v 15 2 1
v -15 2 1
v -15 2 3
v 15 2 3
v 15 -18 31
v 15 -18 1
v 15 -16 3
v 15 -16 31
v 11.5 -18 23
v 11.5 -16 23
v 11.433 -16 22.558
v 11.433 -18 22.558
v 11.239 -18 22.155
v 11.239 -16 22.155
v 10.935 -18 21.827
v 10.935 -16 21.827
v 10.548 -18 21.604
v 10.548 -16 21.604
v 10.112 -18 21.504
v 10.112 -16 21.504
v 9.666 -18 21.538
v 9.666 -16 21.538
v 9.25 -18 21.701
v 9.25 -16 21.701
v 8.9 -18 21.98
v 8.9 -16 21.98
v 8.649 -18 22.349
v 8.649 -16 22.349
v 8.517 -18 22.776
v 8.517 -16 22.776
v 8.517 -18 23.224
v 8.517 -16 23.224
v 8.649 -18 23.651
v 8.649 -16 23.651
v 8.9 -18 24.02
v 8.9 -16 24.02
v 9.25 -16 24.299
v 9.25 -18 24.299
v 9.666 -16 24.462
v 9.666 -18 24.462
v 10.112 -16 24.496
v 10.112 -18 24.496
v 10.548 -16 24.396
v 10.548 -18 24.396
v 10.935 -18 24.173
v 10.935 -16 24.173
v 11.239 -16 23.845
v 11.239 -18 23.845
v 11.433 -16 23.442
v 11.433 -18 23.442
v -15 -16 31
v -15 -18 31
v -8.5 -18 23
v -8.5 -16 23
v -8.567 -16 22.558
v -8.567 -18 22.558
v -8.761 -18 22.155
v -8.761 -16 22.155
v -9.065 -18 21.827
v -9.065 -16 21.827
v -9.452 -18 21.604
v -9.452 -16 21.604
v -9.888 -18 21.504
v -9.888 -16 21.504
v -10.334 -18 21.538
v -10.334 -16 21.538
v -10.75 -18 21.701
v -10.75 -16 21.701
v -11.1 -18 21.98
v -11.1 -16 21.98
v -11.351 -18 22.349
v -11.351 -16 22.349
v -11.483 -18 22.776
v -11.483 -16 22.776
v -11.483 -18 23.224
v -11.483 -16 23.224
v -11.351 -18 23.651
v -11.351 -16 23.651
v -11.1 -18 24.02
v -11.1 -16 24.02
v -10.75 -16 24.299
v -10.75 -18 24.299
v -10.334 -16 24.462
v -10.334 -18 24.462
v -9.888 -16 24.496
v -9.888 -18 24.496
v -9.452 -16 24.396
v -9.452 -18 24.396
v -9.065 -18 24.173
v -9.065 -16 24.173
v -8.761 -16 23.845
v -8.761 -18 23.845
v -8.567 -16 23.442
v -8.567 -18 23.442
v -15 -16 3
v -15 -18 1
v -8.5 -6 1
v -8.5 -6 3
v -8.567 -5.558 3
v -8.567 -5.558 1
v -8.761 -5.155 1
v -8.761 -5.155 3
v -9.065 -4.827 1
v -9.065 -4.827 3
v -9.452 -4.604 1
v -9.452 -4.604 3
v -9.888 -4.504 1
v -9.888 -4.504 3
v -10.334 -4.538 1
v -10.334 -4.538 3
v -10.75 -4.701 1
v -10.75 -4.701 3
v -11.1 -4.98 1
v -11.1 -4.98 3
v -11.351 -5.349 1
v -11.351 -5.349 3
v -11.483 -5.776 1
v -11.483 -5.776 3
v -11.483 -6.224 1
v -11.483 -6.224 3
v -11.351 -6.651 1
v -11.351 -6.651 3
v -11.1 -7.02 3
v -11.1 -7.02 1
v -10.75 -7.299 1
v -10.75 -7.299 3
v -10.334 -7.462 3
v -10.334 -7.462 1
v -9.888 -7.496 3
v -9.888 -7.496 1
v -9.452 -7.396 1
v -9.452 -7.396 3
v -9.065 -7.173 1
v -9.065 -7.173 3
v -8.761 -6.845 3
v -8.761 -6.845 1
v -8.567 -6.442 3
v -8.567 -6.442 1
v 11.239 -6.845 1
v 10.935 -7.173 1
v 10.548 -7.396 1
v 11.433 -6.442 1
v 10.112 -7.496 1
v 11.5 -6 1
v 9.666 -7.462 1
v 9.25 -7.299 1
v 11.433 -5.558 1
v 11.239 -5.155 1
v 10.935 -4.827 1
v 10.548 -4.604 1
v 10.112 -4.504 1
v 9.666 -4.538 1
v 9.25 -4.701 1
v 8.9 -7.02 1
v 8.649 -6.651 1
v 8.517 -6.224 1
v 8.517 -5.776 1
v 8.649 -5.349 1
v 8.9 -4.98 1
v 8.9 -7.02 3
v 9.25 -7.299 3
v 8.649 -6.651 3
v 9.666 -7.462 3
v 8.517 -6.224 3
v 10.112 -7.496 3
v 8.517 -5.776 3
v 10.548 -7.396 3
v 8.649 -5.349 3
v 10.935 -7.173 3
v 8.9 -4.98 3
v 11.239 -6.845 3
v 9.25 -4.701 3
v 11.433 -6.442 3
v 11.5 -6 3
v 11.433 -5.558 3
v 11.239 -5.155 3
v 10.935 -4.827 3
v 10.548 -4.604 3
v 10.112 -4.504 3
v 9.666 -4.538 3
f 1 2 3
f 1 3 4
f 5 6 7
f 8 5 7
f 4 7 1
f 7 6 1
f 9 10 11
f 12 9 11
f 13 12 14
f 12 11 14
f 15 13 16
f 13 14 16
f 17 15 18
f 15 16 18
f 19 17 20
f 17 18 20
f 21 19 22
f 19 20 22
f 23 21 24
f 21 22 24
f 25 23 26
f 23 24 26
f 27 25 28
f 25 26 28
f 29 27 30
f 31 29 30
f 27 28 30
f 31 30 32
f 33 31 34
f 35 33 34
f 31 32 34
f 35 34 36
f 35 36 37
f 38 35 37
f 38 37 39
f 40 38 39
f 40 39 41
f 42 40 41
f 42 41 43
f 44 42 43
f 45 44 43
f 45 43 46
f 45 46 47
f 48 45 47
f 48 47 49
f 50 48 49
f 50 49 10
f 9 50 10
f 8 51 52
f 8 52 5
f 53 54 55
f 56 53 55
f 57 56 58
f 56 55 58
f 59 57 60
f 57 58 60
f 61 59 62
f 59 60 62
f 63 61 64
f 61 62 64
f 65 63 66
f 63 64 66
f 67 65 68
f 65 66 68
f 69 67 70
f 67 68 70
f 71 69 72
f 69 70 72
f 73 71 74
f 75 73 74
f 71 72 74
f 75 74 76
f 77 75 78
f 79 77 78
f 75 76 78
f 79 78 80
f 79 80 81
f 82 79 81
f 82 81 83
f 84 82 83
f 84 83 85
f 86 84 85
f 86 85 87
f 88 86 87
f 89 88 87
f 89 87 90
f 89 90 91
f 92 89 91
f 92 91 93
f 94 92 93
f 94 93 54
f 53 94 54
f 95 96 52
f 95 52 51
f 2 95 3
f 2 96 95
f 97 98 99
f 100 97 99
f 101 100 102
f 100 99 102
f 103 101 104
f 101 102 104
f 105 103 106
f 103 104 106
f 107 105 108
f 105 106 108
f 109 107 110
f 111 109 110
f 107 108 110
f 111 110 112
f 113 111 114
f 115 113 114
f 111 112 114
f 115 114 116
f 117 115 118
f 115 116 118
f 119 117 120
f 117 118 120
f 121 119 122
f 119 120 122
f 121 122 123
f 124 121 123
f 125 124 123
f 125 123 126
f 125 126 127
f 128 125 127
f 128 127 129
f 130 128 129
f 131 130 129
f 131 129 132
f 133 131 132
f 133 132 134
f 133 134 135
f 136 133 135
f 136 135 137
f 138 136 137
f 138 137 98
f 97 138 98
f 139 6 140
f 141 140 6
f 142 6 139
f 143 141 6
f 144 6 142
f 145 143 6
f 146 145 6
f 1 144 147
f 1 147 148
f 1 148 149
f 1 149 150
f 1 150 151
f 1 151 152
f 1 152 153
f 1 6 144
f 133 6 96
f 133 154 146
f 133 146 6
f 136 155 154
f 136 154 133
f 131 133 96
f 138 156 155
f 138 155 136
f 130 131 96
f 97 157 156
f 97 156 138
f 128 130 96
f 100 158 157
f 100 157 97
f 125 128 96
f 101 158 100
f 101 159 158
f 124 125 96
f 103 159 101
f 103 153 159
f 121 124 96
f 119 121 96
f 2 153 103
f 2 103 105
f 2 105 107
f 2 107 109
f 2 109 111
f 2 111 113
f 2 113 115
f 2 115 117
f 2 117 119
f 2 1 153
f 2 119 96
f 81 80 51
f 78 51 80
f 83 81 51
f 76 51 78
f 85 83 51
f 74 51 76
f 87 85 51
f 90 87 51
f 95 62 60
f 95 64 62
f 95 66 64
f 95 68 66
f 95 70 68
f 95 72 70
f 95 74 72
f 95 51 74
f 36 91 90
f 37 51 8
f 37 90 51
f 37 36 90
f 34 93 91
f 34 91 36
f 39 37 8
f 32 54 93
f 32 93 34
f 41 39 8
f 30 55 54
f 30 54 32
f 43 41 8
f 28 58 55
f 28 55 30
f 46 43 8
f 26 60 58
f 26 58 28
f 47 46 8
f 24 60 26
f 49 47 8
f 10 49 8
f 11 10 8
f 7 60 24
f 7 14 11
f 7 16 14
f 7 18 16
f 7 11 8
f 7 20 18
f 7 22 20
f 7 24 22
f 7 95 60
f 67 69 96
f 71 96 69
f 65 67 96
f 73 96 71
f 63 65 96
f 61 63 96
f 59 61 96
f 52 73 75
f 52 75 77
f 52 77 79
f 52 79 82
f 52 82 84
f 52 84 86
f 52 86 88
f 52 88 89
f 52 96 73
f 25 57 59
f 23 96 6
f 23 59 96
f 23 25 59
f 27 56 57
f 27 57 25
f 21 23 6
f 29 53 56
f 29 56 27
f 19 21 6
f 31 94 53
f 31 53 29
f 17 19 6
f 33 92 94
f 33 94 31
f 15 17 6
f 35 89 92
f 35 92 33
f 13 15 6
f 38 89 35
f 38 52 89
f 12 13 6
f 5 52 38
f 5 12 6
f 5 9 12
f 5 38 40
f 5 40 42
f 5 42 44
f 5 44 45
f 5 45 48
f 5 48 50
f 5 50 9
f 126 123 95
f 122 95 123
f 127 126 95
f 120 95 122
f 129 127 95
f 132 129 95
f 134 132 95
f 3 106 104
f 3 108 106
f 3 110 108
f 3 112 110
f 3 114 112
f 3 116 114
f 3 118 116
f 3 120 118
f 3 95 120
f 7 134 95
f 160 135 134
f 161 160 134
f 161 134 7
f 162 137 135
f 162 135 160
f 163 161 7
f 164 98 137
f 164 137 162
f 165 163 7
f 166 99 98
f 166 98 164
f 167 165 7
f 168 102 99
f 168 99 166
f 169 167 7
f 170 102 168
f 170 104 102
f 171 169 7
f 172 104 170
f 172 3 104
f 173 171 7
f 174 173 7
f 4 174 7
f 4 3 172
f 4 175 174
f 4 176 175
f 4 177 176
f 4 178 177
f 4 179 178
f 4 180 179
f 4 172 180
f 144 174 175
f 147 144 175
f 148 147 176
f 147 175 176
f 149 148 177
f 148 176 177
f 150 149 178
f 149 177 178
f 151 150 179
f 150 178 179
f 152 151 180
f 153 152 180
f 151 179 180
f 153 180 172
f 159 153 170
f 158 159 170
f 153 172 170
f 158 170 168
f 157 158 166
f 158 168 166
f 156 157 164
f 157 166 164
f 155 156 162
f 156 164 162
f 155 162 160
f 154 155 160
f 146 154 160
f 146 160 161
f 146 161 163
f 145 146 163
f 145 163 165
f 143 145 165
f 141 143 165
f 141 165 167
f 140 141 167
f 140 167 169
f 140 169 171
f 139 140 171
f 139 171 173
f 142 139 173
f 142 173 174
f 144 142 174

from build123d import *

# Parameters (mm, degrees)
SKETCH_1_W          = 30
SKETCH_1_H          = 38
EXTRUDE_1_DEPTH     = 3
SKETCH_2_W          = 30
SKETCH_2_H          = 3
EXTRUDE_2_DEPTH     = 35
SKETCH_3_R          = 1.5
CUT_EXTRUDE_1_DEPTH = 35
SKETCH_4_R          = 1.5
CUT_EXTRUDE_2_DEPTH = 35
SKETCH_5_W          = 88.636762999
SKETCH_5_H          = 63.593874591
CUT_EXTRUDE_3_DEPTH = 1
SKETCH_6_W          = 48.892654417
SKETCH_6_H          = 42.932057718
CUT_EXTRUDE_4_DEPTH = 1
SKETCH_7_W          = 36.310850366
SKETCH_7_H          = 6.739338697
CUT_EXTRUDE_5_DEPTH = 7
SKETCH_8_W          = 38.639290764
SKETCH_8_H          = 12.957782525
CUT_EXTRUDE_6_DEPTH = 17


with BuildPart() as part:
    # 草图1 → 凸台-拉伸1 (new body)
    with BuildSketch(Plane.XY):
        Rectangle(SKETCH_1_W, SKETCH_1_H)
    extrude(amount=EXTRUDE_1_DEPTH)

    # 草图2 → 凸台-拉伸2 (add)
    with BuildSketch(Plane.XY.offset(3)):
        with Locations((0, -17.5)):
            Rectangle(SKETCH_2_W, SKETCH_2_H)
    extrude(amount=EXTRUDE_2_DEPTH)

    # 草图3 → 切除-拉伸1 (cut)
    with BuildSketch(Plane.XY.offset(3)):
        with Locations((-10, -6)):
            Circle(SKETCH_3_R)
        with Locations((10, -6)):
            Circle(SKETCH_3_R)
    extrude(amount=-CUT_EXTRUDE_1_DEPTH, mode=Mode.SUBTRACT)

    # 草图4 → 切除-拉伸2 (cut)
    with BuildSketch(Plane(origin=(0, -16, 0), x_dir=(1, 0, 0), z_dir=(0, 1, 0))):
        with Locations((-10, -23)):
            Circle(SKETCH_4_R)
        with Locations((10, -23)):
            Circle(SKETCH_4_R)
    extrude(amount=-CUT_EXTRUDE_2_DEPTH, mode=Mode.SUBTRACT)

    # 草图5 → 切除-拉伸3 (cut)
    with BuildSketch(Plane.XZ.offset(19)):
        with Locations((3.130084419, 17.677441591)):
            Rectangle(SKETCH_5_W, SKETCH_5_H)
    extrude(amount=-CUT_EXTRUDE_3_DEPTH, mode=Mode.SUBTRACT)

    # 草图6 → 切除-拉伸4 (cut)
    with BuildSketch(Plane(origin=(0, 0, 0), x_dir=(-1, 0, 0), z_dir=(0, 0, -1))):
        with Locations((1.260467489, 1.250792639)):
            Rectangle(SKETCH_6_W, SKETCH_6_H)
    extrude(amount=-CUT_EXTRUDE_4_DEPTH, mode=Mode.SUBTRACT)

    # 草图7 → 切除-拉伸5 (cut)
    with BuildSketch(Plane.XY.offset(38)):
        with Locations((-0.942459464, -16.150780979)):
            Rectangle(SKETCH_7_W, SKETCH_7_H)
    extrude(amount=-CUT_EXTRUDE_5_DEPTH, mode=Mode.SUBTRACT)

    # 草图8 → 切除-拉伸6 (cut)
    with BuildSketch(Plane(origin=(0, 19, 0), x_dir=(1, 0, 0), z_dir=(0, 1, 0))):
        with Locations((-0.082193205, -0.869277183)):
            Rectangle(SKETCH_8_W, SKETCH_8_H)
    extrude(amount=-CUT_EXTRUDE_6_DEPTH, mode=Mode.SUBTRACT)


solid = part.part
